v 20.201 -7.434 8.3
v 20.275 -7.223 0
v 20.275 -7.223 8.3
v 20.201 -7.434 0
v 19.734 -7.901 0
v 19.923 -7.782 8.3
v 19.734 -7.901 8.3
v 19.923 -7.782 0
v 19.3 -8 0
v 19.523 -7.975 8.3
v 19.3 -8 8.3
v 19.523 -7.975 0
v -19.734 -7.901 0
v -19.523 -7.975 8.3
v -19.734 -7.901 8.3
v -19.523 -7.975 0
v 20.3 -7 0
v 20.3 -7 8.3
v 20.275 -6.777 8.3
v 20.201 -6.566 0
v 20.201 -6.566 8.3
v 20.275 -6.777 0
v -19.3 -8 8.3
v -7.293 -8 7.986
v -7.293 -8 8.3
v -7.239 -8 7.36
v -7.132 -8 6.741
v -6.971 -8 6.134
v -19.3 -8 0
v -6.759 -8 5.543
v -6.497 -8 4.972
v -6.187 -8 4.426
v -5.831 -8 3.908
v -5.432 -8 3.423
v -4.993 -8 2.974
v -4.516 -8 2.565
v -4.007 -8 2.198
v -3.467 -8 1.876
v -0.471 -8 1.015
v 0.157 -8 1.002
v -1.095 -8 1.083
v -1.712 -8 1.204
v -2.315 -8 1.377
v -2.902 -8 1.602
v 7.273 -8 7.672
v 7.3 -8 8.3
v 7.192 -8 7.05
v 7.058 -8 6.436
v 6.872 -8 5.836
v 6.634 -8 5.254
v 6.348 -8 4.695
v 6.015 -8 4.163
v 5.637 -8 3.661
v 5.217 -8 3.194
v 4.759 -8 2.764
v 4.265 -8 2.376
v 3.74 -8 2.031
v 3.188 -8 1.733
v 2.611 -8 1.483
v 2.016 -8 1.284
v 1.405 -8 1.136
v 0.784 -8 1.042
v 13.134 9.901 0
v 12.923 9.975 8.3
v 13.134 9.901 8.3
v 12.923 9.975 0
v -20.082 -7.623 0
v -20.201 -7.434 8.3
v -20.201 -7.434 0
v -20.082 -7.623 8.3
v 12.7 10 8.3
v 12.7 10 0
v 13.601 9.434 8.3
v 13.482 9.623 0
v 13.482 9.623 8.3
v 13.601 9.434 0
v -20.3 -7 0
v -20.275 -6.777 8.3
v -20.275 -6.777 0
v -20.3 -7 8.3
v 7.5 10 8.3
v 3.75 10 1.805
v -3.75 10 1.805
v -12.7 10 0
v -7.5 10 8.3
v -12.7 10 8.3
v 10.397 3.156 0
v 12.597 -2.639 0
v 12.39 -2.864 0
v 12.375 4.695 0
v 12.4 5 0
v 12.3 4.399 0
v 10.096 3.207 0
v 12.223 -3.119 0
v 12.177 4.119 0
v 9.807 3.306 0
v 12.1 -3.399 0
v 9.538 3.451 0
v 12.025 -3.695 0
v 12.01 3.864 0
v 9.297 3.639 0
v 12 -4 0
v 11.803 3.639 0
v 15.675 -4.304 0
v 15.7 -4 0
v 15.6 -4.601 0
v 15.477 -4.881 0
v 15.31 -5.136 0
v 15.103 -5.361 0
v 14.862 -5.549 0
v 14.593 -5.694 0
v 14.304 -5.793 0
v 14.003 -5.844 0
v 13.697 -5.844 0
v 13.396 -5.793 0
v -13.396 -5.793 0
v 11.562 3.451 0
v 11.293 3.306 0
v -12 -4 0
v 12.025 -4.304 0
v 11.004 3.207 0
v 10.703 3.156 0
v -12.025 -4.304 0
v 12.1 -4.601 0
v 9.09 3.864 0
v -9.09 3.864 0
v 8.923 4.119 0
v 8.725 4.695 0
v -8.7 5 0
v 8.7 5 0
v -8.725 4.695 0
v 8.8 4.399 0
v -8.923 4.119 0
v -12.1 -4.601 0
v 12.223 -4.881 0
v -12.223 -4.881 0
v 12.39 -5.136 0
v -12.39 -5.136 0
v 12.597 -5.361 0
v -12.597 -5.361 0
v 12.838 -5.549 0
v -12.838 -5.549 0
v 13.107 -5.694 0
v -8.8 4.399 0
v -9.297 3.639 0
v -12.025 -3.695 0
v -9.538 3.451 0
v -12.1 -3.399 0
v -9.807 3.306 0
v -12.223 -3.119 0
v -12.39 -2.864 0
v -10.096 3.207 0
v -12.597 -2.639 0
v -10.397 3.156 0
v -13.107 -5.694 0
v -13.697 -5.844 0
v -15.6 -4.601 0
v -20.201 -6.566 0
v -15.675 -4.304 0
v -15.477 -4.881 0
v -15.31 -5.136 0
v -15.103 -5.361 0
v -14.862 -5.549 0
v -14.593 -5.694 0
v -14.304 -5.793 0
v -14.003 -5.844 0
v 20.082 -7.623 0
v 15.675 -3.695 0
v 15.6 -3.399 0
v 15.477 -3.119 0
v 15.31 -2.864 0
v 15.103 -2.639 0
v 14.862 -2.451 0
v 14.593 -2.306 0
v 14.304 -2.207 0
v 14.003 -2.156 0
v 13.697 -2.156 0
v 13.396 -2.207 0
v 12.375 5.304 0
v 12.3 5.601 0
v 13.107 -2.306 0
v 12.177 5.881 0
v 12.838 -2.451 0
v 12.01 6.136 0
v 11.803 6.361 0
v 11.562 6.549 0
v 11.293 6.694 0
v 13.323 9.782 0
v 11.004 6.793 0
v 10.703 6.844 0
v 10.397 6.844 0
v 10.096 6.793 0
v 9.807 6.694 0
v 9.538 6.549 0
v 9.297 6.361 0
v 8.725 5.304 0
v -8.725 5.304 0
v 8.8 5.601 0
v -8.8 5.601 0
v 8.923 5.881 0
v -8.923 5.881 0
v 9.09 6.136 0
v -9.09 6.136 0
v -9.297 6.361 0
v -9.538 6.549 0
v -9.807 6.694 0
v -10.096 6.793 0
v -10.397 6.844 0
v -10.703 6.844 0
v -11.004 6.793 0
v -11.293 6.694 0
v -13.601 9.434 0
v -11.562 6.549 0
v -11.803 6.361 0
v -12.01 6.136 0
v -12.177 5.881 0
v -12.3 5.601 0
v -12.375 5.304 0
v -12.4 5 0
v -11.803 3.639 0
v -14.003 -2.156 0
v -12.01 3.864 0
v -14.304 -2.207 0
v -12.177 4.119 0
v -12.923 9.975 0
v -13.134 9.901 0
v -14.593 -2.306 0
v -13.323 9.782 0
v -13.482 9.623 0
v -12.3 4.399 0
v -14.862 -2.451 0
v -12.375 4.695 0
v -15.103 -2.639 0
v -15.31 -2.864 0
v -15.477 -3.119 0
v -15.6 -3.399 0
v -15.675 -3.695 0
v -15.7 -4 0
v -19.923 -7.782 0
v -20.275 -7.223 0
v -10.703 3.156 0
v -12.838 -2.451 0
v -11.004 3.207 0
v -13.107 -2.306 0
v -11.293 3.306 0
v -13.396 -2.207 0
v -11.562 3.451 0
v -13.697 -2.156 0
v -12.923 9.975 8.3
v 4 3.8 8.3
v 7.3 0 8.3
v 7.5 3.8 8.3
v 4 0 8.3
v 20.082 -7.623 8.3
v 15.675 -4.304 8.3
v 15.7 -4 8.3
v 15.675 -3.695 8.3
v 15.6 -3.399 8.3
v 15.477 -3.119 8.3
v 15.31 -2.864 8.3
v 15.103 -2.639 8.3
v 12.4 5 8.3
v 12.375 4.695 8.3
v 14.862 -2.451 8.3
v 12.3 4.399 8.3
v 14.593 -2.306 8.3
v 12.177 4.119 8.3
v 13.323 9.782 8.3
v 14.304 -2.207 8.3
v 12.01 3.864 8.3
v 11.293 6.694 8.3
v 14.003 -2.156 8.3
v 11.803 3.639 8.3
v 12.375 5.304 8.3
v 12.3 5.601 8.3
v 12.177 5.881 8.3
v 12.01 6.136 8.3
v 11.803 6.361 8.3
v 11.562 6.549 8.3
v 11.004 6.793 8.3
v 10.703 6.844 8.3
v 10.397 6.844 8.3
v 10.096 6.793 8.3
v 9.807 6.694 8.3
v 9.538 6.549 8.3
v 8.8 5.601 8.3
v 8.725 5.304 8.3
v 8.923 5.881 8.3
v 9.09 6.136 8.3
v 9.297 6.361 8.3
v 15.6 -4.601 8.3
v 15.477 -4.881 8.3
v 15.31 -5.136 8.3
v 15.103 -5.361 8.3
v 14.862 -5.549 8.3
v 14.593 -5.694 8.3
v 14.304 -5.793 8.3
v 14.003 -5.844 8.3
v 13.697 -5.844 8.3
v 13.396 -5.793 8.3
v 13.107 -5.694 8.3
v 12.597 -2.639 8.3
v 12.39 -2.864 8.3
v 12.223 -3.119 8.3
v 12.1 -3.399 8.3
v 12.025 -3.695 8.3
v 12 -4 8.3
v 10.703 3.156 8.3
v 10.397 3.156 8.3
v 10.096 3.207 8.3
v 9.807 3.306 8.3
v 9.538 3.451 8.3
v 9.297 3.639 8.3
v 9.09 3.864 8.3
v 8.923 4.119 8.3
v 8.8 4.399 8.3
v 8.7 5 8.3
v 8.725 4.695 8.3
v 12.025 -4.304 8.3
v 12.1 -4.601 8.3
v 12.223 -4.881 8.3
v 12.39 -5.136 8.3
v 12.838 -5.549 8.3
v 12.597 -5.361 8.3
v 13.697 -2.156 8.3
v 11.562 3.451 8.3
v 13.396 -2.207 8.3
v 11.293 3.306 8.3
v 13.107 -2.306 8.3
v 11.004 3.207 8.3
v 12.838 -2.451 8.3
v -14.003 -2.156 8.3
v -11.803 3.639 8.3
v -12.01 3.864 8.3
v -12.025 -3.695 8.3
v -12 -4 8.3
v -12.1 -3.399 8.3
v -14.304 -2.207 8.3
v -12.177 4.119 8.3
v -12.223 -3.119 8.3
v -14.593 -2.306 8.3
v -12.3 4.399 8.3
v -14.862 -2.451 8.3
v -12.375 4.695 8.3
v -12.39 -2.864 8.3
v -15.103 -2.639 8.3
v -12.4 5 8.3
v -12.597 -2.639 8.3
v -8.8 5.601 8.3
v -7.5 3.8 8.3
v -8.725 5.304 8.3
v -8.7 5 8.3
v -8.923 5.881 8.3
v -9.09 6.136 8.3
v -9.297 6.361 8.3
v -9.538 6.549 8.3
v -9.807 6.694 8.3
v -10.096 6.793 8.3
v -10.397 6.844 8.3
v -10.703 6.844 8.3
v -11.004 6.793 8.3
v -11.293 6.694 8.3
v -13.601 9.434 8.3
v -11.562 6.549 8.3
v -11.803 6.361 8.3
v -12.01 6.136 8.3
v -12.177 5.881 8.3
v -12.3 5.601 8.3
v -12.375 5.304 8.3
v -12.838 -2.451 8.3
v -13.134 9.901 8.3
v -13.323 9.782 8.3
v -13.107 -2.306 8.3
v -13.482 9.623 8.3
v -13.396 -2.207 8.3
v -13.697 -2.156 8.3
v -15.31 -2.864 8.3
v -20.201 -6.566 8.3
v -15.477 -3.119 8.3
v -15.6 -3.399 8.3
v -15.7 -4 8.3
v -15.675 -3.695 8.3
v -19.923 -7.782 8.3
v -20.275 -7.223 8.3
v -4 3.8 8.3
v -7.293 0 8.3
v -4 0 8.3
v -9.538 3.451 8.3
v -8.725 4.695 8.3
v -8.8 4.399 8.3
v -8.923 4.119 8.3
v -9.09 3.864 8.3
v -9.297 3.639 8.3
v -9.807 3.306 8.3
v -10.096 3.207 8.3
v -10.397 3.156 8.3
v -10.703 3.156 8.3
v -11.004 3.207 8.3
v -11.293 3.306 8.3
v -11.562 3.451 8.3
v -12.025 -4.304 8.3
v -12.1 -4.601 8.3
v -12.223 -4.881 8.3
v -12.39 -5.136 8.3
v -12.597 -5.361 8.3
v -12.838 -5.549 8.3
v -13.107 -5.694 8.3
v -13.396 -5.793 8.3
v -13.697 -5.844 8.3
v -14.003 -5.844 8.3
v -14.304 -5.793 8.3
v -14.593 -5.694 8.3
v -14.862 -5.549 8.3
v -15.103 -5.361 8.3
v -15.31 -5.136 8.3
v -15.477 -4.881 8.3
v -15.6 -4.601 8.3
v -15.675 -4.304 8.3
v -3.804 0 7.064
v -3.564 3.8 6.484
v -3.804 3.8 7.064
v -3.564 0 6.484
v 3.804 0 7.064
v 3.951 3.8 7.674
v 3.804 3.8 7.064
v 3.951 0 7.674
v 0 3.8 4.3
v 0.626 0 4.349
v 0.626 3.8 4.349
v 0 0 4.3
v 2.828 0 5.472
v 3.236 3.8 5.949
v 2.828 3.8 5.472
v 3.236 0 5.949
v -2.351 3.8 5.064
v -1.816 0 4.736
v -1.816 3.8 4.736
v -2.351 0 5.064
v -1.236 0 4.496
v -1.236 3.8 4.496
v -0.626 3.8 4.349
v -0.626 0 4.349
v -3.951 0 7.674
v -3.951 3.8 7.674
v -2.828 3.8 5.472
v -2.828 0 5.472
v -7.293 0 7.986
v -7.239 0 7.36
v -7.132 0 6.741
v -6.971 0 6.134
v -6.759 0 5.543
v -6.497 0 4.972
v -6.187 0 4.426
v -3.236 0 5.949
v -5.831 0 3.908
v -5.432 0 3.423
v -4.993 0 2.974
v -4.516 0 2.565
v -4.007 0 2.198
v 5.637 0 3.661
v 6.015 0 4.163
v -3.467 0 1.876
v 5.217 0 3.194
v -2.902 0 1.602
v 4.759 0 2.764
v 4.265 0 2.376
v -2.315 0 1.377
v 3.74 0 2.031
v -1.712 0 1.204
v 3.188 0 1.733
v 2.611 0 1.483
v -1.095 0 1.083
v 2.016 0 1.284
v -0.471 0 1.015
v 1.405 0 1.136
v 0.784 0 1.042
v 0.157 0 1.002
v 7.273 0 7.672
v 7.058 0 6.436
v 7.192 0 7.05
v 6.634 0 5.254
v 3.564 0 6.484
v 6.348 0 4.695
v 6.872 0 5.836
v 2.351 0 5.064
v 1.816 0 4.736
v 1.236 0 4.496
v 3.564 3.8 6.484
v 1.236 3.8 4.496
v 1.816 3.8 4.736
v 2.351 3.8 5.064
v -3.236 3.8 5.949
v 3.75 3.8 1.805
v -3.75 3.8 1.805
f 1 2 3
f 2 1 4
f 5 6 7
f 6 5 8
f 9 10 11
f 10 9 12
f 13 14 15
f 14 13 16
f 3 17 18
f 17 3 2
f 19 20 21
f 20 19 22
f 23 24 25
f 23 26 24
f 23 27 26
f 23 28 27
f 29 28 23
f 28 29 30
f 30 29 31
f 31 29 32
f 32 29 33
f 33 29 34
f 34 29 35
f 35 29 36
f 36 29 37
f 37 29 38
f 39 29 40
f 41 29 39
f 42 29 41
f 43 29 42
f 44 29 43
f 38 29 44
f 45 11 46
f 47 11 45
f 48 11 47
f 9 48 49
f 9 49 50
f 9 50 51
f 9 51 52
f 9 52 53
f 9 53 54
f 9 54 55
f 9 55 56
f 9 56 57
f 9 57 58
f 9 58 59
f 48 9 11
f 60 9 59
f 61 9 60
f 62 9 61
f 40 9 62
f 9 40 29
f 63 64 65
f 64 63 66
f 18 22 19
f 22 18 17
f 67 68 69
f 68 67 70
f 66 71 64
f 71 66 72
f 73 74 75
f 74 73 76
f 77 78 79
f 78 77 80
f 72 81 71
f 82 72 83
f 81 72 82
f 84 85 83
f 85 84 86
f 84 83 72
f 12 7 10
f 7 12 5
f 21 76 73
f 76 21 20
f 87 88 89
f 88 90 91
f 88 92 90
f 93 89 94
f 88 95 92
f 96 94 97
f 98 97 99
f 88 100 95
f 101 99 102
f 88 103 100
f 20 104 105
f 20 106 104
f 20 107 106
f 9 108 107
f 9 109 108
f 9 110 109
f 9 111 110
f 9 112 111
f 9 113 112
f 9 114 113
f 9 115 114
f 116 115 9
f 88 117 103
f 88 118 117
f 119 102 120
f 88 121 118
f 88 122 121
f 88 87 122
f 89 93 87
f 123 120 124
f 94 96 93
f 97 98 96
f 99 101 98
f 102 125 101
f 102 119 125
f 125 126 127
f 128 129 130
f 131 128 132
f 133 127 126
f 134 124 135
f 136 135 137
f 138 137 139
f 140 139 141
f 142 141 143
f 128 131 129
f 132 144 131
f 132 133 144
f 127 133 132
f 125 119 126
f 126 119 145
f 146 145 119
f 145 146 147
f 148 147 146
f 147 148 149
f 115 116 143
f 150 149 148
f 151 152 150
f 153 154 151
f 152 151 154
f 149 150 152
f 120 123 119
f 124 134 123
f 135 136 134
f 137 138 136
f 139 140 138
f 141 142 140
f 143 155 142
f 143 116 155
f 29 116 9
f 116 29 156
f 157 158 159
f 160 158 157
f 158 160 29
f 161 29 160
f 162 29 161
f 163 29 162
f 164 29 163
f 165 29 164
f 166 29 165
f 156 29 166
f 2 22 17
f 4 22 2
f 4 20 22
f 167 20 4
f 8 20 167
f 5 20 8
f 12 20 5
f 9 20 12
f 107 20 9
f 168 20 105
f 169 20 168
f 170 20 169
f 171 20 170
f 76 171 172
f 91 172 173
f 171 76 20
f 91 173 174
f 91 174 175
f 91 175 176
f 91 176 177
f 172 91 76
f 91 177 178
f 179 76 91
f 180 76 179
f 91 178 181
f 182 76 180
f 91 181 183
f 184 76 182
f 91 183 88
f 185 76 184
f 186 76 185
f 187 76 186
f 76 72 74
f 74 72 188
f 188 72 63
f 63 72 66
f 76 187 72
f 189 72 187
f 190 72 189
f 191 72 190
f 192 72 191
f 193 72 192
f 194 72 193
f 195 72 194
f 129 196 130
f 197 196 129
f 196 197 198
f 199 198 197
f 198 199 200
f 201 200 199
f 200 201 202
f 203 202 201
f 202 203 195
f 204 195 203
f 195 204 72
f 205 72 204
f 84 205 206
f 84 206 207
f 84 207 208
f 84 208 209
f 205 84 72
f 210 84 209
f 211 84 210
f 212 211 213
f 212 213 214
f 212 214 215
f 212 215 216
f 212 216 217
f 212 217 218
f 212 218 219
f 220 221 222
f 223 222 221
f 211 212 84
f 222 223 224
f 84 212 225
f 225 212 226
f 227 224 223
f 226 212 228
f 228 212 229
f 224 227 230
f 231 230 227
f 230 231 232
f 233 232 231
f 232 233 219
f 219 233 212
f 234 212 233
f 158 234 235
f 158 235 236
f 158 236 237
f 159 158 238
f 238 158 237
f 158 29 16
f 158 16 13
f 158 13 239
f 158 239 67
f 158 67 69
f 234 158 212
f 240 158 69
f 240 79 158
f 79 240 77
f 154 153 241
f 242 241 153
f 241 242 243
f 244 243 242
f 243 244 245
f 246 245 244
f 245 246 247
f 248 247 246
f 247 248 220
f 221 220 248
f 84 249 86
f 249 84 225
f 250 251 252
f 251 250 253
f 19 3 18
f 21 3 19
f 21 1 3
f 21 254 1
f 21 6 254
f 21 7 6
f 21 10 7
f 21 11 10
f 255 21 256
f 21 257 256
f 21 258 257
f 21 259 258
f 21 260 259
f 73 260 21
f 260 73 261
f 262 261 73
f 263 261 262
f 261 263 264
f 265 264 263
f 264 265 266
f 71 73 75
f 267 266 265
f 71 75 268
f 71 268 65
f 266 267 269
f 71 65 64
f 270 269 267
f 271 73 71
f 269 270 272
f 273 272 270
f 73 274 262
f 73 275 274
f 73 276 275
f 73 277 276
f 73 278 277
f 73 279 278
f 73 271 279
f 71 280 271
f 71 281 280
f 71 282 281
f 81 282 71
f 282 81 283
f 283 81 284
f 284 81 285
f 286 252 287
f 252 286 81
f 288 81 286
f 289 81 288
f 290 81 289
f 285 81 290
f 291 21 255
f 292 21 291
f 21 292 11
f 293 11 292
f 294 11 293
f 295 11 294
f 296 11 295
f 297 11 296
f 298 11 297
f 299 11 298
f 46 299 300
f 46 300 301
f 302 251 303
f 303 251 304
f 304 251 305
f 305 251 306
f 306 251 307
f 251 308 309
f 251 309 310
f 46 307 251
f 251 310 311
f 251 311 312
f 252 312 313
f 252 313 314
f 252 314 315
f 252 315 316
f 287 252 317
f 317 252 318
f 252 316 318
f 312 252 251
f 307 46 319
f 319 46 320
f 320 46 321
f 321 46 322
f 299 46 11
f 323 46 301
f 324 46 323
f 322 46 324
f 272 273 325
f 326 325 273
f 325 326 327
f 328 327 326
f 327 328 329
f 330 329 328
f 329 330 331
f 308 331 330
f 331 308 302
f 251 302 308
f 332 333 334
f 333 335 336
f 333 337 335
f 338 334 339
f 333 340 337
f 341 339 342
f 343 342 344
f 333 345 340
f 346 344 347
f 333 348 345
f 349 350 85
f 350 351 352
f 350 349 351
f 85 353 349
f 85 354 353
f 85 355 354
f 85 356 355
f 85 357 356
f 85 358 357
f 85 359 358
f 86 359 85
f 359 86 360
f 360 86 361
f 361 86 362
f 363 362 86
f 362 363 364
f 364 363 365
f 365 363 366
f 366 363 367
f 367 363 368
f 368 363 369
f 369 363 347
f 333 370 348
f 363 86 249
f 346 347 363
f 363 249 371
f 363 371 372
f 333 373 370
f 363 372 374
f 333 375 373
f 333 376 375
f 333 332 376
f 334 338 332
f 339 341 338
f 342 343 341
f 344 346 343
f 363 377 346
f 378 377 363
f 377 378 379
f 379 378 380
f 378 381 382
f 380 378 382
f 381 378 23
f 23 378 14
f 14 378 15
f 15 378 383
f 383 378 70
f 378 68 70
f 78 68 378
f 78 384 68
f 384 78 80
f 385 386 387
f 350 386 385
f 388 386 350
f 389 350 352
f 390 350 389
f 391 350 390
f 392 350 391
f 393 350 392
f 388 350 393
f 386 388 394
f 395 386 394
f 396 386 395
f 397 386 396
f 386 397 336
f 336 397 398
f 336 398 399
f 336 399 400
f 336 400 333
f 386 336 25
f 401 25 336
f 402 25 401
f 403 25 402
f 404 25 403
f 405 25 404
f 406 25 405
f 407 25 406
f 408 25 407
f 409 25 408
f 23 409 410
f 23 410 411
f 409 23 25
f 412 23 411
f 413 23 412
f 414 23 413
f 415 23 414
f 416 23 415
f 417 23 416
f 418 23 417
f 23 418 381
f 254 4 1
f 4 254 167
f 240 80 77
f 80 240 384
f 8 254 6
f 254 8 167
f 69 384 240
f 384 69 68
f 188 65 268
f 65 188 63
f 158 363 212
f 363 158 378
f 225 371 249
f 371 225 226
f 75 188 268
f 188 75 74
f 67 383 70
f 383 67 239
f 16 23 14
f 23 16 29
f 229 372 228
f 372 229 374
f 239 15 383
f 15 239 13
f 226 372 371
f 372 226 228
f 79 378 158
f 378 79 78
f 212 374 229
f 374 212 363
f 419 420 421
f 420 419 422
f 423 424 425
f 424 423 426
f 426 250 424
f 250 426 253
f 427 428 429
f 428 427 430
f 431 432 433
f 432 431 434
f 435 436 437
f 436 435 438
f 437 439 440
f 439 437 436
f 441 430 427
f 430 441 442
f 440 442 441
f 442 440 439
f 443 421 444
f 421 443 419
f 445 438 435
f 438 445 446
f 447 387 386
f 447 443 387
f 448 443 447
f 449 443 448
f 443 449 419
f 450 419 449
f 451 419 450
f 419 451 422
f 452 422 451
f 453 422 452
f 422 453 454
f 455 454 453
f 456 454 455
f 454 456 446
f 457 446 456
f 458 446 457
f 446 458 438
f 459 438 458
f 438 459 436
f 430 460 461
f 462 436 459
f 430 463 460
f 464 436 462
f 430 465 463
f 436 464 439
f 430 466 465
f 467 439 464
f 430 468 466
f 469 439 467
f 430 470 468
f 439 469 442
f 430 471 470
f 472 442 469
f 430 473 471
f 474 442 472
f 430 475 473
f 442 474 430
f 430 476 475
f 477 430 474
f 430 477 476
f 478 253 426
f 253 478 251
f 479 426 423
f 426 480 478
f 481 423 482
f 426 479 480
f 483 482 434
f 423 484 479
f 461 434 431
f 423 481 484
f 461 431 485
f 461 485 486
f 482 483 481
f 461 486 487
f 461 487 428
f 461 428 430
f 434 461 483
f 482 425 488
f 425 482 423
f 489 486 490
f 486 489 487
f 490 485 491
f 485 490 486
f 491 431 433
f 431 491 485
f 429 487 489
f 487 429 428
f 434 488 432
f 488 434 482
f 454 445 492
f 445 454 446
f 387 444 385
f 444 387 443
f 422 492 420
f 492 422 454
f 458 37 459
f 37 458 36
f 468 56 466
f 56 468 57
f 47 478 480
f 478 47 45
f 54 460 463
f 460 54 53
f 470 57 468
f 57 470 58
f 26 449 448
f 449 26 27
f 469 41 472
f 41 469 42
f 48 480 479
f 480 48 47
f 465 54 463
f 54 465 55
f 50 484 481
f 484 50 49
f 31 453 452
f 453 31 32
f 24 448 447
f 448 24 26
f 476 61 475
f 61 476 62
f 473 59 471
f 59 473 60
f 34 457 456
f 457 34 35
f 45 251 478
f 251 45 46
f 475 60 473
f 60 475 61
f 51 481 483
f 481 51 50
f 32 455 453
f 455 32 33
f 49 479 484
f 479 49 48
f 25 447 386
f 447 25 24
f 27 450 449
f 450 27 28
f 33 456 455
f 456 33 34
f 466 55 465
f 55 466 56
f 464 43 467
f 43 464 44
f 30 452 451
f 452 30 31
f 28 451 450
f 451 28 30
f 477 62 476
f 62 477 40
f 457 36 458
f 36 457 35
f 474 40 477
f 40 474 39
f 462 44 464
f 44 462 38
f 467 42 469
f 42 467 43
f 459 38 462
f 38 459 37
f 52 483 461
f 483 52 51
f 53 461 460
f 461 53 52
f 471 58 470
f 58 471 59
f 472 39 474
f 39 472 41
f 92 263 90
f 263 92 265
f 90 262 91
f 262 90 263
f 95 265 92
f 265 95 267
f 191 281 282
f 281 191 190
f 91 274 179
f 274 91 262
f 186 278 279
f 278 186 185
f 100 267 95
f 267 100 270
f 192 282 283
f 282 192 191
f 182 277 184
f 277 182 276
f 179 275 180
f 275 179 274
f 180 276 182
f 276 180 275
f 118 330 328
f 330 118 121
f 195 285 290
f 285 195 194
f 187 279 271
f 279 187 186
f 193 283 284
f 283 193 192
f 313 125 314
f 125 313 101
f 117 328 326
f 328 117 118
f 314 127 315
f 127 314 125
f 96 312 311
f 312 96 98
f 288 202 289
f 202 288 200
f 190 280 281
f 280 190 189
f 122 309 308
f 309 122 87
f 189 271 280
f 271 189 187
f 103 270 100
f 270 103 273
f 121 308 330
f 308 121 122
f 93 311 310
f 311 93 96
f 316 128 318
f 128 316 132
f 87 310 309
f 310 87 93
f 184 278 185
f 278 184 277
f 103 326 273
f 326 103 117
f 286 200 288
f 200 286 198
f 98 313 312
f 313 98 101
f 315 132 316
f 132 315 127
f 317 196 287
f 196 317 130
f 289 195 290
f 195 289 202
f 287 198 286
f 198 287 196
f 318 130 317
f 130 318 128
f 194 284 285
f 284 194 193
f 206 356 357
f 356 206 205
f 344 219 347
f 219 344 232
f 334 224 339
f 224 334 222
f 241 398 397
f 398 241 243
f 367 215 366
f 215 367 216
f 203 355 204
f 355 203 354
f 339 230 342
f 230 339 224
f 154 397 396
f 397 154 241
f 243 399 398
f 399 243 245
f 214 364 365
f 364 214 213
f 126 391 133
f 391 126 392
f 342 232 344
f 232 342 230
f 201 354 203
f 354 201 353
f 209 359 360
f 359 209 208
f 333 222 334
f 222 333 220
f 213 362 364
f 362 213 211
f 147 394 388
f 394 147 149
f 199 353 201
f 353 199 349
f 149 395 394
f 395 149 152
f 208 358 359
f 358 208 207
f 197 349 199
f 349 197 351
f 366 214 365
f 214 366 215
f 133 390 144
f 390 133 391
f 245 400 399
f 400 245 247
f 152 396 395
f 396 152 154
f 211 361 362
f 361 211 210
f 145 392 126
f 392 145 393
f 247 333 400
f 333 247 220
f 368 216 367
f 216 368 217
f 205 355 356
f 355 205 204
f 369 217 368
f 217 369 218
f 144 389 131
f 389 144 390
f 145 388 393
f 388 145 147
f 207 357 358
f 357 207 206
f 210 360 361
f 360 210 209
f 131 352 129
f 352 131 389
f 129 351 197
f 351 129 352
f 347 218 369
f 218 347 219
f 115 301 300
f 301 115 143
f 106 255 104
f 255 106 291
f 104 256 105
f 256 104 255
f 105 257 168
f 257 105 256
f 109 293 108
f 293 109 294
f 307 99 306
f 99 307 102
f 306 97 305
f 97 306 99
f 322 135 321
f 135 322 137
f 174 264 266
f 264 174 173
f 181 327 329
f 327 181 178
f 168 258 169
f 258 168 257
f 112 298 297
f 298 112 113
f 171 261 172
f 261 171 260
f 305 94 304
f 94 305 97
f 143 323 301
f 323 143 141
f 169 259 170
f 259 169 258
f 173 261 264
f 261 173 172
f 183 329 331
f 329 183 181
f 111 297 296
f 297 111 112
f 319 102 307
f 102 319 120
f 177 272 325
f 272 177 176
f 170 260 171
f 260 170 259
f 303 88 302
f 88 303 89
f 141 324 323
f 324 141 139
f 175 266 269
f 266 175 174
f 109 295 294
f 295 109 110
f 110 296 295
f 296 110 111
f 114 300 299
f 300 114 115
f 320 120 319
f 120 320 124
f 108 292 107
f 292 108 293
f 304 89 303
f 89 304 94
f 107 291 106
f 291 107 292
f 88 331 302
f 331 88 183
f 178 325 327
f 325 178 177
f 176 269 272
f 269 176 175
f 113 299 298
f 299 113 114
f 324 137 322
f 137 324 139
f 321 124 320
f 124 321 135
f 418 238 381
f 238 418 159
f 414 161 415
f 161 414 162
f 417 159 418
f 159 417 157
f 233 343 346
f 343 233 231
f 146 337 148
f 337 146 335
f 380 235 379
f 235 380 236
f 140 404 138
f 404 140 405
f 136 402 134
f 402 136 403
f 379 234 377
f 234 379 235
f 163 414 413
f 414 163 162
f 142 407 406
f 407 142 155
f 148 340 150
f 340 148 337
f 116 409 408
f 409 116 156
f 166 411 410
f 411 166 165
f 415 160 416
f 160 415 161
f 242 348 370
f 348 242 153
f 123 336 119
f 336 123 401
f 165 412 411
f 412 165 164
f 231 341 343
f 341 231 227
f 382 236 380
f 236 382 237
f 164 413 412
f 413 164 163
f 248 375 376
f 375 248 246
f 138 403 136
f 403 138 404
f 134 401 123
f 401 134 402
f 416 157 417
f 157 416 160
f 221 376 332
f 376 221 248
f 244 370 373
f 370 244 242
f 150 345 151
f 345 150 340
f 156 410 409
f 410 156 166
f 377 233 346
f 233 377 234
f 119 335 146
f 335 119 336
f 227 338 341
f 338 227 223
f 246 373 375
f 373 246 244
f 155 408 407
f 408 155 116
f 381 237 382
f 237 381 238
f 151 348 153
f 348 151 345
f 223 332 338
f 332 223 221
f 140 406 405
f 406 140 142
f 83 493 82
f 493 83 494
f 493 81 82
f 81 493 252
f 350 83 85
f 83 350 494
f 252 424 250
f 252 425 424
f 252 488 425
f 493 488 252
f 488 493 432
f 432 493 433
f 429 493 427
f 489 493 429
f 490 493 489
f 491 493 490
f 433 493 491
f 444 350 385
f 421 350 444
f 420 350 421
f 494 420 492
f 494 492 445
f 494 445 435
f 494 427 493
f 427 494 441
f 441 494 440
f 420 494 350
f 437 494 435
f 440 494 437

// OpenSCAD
shaft_diameter_a = 8;
nut_diameter_a = 15;
nut_length_a = 6.4;
shaft_length_a = 10;

shaft_diameter_b = 14.6;
nut_diameter_b = 5;
nut_length_b = 6.4;
shaft_length_b = 8;

coupler_mount_hole_diameter = 3.7;
coupler_extra_thickness = 1;

thickest_diam = shaft_diameter_a > shaft_diameter_b ? shaft_diameter_a : shaft_diameter_b;

translate([0,0,thickest_diam/2 + coupler_extra_thickness])
rotate([180,0,0])
{

    difference()
    {
        hull()
        {
            translate([
                        shaft_diameter_a + (1*coupler_extra_thickness) + coupler_mount_hole_diameter,
            -(shaft_length_a -coupler_extra_thickness),0])
            cylinder(r=coupler_extra_thickness,h=thickest_diam/2 + coupler_extra_thickness, $fn=28);

            mirror([1,0,0])
            translate([
                        shaft_diameter_a + (1*coupler_extra_thickness) + coupler_mount_hole_diameter,
            -(shaft_length_a -coupler_extra_thickness),0])
            cylinder(r=coupler_extra_thickness,h=thickest_diam/2 + coupler_extra_thickness, $fn=28);


            translate([
                        shaft_diameter_b + (1*coupler_extra_thickness) + coupler_mount_hole_diameter,
            (shaft_length_b -coupler_extra_thickness),0])
            cylinder(r=coupler_extra_thickness,h=thickest_diam/2 + coupler_extra_thickness, $fn=28);

            mirror([1,0,0])
            translate([
                        shaft_diameter_b + (1*coupler_extra_thickness) + coupler_mount_hole_diameter,
            (shaft_length_b -coupler_extra_thickness),0])
            cylinder(r=coupler_extra_thickness,h=thickest_diam/2 + coupler_extra_thickness, $fn=28);
        }

        color("Red")
        rotate([90,0,0])
        cylinder(r=shaft_diameter_a/2,h=shaft_length_a+1,$fn=shaft_diameter_a*5);

        color("Blue")
        rotate([-90,0,0])
        cylinder(r=shaft_diameter_b/2,h=shaft_length_b+1,$fn=shaft_diameter_b*5);

        /*
         *
         *  Mounting
         *
         */
        color("Green")
        translate([shaft_diameter_a/2 + coupler_extra_thickness + coupler_mount_hole_diameter*1.5,-shaft_length_a/2,0])
        cylinder(r=coupler_mount_hole_diameter/2,h=50,$fn=38);

        mirror([1,0,0])
        color("Green")
        translate([shaft_diameter_a/2 + coupler_extra_thickness + coupler_mount_hole_diameter*1.5,-shaft_length_a/2,0])
        cylinder(r=coupler_mount_hole_diameter/2,h=50,$fn=38);

        color("Green")
        translate([shaft_diameter_b/2 + coupler_extra_thickness + coupler_mount_hole_diameter*1.5,shaft_length_b/2,0])
        cylinder(r=coupler_mount_hole_diameter/2,h=50,$fn=38);

        mirror([1,0,0])
        color("Green")
        translate([shaft_diameter_b/2 + coupler_extra_thickness + coupler_mount_hole_diameter*1.5,shaft_length_b/2,0])
        cylinder(r=coupler_mount_hole_diameter/2,h=50,$fn=38);

        /*
         *
         *  Nut
         *
         */

        color("Red")
        translate([0,-shaft_length_a+nut_length_a - 0.2,0])
        rotate([90,0,0])
        cylinder(r=nut_diameter_a/2,h=nut_length_a,$fn=6);

        color("Blue")
        translate([0,shaft_length_b-nut_length_b + 0.2,0])
        rotate([-90,0,0])
        cylinder(r=nut_diameter_b/2,h=nut_length_b,$fn=6);
    }
}
